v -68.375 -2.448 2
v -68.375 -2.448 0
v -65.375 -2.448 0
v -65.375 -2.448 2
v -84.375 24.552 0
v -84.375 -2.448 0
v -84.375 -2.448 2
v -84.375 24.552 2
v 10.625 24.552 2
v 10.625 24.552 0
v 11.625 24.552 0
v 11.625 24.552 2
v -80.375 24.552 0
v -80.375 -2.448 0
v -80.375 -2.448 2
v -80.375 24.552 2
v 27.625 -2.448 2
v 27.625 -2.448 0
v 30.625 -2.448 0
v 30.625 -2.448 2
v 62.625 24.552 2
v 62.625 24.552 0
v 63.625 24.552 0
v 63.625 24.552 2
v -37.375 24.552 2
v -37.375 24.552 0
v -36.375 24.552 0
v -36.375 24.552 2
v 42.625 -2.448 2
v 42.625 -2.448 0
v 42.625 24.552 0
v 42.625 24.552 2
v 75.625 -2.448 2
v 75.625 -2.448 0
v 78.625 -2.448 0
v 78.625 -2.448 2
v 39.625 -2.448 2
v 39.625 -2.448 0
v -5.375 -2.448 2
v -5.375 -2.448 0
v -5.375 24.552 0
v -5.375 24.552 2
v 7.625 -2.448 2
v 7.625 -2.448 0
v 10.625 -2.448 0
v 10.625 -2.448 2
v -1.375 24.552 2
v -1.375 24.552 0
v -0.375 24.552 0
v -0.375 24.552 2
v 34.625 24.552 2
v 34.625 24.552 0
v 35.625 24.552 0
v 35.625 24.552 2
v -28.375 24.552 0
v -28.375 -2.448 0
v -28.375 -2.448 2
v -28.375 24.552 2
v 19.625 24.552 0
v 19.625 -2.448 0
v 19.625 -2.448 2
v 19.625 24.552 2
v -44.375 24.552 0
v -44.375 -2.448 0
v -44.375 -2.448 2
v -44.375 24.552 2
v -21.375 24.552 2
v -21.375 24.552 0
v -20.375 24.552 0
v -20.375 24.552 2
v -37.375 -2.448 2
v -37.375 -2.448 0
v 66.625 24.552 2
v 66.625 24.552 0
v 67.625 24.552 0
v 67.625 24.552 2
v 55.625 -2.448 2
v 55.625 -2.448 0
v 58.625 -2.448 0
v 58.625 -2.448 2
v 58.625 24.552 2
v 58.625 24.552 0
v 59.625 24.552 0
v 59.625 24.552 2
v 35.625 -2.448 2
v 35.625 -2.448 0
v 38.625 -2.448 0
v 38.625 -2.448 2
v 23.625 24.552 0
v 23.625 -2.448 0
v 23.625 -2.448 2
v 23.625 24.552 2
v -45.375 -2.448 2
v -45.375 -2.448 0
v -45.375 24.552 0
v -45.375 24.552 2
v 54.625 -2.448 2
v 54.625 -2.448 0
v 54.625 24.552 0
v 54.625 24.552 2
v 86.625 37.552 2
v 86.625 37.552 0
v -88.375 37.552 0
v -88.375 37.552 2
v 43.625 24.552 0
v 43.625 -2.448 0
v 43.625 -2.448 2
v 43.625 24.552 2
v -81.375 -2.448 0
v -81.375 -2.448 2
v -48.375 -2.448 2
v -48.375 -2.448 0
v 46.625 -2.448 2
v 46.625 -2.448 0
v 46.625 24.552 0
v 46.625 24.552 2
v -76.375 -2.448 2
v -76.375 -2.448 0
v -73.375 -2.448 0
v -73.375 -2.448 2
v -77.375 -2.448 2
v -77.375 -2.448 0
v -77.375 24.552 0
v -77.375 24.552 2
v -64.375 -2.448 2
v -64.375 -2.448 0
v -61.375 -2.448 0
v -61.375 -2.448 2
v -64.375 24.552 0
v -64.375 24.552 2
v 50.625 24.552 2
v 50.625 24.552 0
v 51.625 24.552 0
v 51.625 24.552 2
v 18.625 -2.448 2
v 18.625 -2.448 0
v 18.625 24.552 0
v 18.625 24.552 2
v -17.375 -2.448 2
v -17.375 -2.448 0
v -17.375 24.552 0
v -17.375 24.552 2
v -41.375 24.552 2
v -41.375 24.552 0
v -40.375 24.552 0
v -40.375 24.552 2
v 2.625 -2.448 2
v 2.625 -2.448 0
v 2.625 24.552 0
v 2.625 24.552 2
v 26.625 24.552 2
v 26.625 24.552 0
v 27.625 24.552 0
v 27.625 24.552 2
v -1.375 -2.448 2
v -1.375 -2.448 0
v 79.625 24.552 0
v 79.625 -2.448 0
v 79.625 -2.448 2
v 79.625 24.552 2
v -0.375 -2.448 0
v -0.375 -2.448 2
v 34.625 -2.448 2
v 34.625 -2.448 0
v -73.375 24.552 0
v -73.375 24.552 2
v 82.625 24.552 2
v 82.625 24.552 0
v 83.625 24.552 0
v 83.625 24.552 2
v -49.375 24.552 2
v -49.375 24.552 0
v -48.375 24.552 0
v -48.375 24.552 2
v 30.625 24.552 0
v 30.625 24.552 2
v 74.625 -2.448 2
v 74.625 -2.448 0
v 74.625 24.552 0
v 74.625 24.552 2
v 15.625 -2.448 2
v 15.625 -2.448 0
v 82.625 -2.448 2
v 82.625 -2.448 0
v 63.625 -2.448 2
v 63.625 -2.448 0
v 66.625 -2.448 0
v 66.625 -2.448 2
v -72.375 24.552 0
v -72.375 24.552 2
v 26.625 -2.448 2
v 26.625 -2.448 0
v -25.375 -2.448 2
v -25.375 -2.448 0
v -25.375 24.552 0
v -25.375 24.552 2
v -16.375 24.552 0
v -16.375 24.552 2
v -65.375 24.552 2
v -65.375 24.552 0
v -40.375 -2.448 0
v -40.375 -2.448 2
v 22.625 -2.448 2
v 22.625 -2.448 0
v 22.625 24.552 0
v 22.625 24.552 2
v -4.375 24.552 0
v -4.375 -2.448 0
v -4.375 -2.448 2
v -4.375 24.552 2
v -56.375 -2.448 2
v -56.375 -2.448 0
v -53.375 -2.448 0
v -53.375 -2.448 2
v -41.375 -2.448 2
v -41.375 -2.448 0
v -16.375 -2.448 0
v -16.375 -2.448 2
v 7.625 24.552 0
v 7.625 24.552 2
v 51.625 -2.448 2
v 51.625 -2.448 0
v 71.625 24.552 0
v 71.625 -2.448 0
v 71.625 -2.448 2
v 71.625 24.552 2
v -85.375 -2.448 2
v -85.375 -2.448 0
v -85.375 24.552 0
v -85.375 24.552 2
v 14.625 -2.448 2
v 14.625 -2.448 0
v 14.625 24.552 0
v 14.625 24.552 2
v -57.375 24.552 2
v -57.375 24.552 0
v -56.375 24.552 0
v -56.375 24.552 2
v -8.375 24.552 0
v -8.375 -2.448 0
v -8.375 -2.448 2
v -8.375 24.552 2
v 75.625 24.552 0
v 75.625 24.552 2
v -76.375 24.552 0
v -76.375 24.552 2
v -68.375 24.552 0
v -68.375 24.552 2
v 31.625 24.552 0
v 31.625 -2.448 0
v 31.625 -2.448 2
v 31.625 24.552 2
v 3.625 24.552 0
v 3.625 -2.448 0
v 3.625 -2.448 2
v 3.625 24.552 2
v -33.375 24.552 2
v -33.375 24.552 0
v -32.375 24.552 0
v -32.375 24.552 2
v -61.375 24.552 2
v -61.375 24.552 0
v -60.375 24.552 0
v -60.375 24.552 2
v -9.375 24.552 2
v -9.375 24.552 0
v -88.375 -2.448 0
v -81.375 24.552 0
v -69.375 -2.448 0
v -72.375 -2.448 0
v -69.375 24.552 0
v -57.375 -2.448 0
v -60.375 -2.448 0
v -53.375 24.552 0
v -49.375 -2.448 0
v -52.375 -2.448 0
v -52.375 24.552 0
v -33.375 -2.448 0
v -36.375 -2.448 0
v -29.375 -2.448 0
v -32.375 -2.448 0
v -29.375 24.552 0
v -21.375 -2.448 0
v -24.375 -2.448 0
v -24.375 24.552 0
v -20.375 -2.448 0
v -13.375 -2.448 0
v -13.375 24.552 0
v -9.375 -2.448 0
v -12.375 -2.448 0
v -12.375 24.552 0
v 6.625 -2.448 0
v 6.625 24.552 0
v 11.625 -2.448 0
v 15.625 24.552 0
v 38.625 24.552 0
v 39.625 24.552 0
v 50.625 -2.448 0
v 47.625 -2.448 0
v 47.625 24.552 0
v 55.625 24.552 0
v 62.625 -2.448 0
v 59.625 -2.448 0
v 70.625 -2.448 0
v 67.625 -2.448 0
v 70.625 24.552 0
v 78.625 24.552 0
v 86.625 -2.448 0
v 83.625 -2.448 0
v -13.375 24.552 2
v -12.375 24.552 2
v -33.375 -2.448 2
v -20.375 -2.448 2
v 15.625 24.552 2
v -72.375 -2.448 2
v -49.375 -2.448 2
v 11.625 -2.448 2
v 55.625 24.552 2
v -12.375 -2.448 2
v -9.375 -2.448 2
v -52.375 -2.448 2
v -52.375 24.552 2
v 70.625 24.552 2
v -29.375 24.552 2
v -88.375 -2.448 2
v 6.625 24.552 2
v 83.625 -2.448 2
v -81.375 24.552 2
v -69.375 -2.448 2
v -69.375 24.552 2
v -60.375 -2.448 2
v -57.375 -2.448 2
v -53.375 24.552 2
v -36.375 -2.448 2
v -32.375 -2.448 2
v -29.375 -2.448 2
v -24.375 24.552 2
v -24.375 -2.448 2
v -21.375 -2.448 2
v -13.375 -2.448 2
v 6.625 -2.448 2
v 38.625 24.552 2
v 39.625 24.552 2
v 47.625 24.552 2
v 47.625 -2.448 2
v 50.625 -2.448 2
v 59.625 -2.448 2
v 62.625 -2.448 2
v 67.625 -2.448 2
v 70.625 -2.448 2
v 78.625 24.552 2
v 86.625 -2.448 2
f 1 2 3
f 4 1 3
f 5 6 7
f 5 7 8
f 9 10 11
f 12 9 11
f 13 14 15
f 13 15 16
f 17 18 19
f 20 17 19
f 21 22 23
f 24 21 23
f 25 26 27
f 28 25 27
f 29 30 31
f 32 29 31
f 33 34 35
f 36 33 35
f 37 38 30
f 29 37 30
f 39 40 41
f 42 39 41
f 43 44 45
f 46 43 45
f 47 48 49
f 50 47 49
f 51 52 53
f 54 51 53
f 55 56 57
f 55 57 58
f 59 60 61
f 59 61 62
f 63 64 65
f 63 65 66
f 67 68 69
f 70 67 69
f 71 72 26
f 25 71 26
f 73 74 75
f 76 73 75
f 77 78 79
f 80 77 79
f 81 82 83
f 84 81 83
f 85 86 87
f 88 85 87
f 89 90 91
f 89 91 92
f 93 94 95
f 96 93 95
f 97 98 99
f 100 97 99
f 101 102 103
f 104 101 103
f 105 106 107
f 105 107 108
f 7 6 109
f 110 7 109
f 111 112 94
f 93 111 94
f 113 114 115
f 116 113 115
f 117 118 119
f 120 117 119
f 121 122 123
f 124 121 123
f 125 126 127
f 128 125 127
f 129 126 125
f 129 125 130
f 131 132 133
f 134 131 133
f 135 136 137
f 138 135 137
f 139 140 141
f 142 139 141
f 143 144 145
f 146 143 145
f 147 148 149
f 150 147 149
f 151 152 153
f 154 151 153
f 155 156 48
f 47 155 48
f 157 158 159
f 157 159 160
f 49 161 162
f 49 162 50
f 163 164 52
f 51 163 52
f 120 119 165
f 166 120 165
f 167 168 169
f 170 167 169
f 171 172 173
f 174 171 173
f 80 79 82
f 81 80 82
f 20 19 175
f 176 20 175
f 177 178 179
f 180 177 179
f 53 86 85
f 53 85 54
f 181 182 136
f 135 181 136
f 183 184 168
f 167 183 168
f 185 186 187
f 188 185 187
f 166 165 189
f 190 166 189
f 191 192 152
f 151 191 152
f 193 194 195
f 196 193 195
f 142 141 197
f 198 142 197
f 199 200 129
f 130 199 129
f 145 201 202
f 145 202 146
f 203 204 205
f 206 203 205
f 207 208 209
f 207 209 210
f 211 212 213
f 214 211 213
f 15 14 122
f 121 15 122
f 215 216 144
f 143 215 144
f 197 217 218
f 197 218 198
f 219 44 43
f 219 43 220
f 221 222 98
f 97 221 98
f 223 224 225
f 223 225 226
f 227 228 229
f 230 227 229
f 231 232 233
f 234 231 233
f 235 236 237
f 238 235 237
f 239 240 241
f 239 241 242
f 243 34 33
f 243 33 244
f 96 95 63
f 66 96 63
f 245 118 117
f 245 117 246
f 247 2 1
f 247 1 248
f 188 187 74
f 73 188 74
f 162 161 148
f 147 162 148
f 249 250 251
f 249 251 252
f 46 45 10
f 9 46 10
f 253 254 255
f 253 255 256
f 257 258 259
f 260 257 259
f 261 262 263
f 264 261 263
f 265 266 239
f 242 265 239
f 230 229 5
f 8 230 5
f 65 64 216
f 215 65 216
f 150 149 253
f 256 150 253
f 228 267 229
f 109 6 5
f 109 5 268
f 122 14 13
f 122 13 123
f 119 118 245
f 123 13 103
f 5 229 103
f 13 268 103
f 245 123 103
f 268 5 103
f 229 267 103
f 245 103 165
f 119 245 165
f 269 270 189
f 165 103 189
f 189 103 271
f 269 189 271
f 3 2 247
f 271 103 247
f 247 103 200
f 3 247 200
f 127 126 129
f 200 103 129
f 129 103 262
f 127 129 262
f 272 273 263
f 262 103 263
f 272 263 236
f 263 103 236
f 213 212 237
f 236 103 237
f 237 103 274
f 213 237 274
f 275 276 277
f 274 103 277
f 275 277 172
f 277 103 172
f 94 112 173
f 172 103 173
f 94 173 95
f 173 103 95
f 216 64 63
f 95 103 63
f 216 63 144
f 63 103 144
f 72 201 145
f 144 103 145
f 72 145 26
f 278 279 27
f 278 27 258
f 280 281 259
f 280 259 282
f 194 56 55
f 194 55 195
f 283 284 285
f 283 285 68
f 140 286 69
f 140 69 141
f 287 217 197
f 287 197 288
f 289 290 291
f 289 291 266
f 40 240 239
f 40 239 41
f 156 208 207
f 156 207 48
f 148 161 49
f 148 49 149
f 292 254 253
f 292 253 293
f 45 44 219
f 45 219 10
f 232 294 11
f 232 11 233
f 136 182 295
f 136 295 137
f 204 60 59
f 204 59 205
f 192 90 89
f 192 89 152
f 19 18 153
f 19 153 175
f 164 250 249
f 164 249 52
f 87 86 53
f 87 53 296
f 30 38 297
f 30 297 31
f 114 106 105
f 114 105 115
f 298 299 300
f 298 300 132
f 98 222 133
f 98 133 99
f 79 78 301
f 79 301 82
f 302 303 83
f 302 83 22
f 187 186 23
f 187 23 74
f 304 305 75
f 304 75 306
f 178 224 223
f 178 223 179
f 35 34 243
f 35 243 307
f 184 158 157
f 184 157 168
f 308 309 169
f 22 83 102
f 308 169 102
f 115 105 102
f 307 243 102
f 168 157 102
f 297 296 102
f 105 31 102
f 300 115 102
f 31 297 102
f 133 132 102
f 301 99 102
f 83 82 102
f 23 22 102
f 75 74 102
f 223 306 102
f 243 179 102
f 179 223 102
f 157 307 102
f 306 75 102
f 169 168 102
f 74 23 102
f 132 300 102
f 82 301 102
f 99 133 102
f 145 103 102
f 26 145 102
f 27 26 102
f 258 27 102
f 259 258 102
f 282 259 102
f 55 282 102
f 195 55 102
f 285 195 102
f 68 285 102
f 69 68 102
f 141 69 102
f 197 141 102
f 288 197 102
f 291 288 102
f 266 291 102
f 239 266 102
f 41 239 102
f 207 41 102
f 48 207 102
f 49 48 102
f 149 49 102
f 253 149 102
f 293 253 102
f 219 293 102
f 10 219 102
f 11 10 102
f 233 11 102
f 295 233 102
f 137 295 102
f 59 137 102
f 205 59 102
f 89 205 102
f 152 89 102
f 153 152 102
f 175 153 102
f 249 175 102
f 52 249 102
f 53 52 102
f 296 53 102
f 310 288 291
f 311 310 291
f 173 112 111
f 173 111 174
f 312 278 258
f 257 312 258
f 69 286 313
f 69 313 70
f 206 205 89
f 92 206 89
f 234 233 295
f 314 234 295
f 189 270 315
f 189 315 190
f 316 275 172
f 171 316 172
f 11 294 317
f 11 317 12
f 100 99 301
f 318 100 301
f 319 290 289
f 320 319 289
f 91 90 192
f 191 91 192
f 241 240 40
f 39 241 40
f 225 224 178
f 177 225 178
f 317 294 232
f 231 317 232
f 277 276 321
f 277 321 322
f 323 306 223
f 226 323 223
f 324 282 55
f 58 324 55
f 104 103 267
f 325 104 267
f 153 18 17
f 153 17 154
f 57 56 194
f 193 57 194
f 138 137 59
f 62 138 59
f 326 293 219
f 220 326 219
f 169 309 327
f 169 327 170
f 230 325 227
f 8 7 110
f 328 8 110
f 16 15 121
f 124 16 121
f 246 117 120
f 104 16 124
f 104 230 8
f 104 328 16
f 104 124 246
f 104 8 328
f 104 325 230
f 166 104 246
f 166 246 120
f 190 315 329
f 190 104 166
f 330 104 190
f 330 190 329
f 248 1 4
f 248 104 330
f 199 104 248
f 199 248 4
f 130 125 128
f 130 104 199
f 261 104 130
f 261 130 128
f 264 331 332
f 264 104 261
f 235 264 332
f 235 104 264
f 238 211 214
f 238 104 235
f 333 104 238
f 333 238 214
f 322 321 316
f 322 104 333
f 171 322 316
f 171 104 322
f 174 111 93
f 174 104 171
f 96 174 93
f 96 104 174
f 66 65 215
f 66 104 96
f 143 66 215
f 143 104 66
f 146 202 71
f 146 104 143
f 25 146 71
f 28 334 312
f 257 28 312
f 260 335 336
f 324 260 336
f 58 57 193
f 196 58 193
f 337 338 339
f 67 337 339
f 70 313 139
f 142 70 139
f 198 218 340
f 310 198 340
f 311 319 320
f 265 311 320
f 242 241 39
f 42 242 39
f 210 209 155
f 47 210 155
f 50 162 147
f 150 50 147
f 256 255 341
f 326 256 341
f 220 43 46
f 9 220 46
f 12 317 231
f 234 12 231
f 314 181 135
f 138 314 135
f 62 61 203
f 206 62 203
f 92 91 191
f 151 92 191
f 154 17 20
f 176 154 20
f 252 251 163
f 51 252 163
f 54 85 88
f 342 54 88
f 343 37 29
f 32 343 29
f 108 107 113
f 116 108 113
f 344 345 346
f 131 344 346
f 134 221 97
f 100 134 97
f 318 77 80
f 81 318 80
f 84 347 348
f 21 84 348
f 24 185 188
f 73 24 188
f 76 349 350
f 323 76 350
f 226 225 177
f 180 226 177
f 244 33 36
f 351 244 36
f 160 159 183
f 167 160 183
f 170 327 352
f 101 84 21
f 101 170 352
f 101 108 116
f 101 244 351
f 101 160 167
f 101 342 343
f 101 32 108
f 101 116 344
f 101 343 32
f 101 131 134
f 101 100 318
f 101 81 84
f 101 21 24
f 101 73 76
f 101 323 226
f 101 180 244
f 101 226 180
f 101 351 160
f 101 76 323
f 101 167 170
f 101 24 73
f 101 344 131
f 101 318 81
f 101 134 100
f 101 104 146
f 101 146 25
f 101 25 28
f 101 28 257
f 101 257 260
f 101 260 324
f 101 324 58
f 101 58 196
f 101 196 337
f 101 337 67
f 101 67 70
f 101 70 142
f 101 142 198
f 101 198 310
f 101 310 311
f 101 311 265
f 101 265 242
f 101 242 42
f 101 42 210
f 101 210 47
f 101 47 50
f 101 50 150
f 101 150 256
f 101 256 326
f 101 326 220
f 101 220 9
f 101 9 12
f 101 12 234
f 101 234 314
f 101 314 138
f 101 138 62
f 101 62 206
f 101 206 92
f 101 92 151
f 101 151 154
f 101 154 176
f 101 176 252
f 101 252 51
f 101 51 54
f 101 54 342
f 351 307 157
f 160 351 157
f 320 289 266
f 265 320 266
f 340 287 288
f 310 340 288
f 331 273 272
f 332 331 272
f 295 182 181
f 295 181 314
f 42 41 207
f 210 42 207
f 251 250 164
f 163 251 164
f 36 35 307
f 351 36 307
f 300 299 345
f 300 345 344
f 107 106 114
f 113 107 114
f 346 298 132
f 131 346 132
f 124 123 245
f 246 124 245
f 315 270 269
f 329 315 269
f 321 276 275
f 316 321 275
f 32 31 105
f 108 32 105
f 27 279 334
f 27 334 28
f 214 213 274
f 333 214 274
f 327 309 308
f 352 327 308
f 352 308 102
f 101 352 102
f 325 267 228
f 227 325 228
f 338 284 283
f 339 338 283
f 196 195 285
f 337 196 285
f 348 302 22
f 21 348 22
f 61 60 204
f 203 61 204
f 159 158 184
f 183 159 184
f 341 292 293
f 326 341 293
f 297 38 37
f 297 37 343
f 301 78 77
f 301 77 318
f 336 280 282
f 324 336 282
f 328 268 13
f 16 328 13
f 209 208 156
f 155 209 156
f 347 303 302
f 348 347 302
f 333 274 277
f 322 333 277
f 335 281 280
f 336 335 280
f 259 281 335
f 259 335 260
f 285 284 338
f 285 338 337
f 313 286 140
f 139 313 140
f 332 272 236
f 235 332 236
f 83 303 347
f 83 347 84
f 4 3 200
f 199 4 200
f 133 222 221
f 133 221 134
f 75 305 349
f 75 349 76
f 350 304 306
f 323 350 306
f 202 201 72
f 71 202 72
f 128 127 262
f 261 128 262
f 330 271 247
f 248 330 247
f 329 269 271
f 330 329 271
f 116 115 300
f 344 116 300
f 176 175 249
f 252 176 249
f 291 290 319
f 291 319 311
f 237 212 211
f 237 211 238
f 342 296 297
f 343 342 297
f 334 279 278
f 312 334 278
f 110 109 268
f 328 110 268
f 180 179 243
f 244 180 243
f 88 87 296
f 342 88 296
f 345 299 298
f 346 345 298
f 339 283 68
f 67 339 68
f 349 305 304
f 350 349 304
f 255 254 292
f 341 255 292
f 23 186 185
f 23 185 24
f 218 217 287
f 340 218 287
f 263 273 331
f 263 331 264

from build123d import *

# Parameters (mm, degrees)
F0_W     = 3
F0_H     = 27
F1_DEPTH = 2


with BuildPart() as f1:
    # F0 (on Top) → F1 (new body)
    with BuildSketch(Plane.XY):
        with Locations((-86.87473, 11.051753)):
            Rectangle(F0_W, F0_H)
        with Locations((-82.87473, 11.051753)):
            Rectangle(F0_W, F0_H)
        with Locations((-78.87473, 11.051753)):
            Rectangle(F0_W, F0_H)
        with Locations((-74.87473, 11.051753)):
            Rectangle(F0_W, F0_H)
        with Locations((-70.87473, 11.051753)):
            Rectangle(F0_W, F0_H)
        with Locations((-66.87473, 11.051753)):
            Rectangle(F0_W, F0_H)
        with Locations((-62.87473, 11.051753)):
            Rectangle(F0_W, F0_H)
        with Locations((-58.87473, 11.051753)):
            Rectangle(F0_W, F0_H)
        with Locations((-54.87473, 11.051753)):
            Rectangle(F0_W, F0_H)
        with Locations((-50.87473, 11.051753)):
            Rectangle(F0_W, F0_H)
        with Locations((-46.87473, 11.051753)):
            Rectangle(F0_W, F0_H)
        with Locations((-42.87473, 11.051753)):
            Rectangle(F0_W, F0_H)
        with Locations((-38.87473, 11.051753)):
            Rectangle(F0_W, F0_H)
        with Locations((-34.87473, 11.051753)):
            Rectangle(F0_W, F0_H)
        with Locations((-30.87473, 11.051753)):
            Rectangle(F0_W, F0_H)
        with Locations((-26.87473, 11.051753)):
            Rectangle(F0_W, F0_H)
        with Locations((-22.87473, 11.051753)):
            Rectangle(F0_W, F0_H)
        with Locations((-18.87473, 11.051753)):
            Rectangle(F0_W, F0_H)
        with Locations((-14.87473, 11.051753)):
            Rectangle(F0_W, F0_H)
        with Locations((-10.87473, 11.051753)):
            Rectangle(F0_W, F0_H)
        with Locations((-6.87473, 11.051753)):
            Rectangle(F0_W, F0_H)
        with Locations((-2.87473, 11.051753)):
            Rectangle(F0_W, F0_H)
        with Locations((1.12527, 11.051753)):
            Rectangle(F0_W, F0_H)
        with Locations((5.12527, 11.051753)):
            Rectangle(F0_W, F0_H)
        with Locations((9.12527, 11.051753)):
            Rectangle(F0_W, F0_H)
        with Locations((13.12527, 11.051753)):
            Rectangle(F0_W, F0_H)
        with Locations((17.12527, 11.051753)):
            Rectangle(F0_W, F0_H)
        with Locations((21.12527, 11.051753)):
            Rectangle(F0_W, F0_H)
        with Locations((25.12527, 11.051753)):
            Rectangle(F0_W, F0_H)
        with Locations((29.12527, 11.051753)):
            Rectangle(F0_W, F0_H)
        with Locations((33.12527, 11.051753)):
            Rectangle(F0_W, F0_H)
        with Locations((37.12527, 11.051753)):
            Rectangle(F0_W, F0_H)
        with Locations((41.12527, 11.051753)):
            Rectangle(F0_W, F0_H)
        with Locations((45.12527, 11.051753)):
            Rectangle(F0_W, F0_H)
        with Locations((49.12527, 11.051753)):
            Rectangle(F0_W, F0_H)
        with Locations((53.12527, 11.051753)):
            Rectangle(F0_W, F0_H)
        with Locations((57.12527, 11.051753)):
            Rectangle(F0_W, F0_H)
        with Locations((61.12527, 11.051753)):
            Rectangle(F0_W, F0_H)
        with Locations((65.12527, 11.051753)):
            Rectangle(F0_W, F0_H)
        with Locations((69.12527, 11.051753)):
            Rectangle(F0_W, F0_H)
        with Locations((73.12527, 11.051753)):
            Rectangle(F0_W, F0_H)
        with Locations((77.12527, 11.051753)):
            Rectangle(F0_W, F0_H)
        with Locations((81.12527, 11.051753)):
            Rectangle(F0_W, F0_H)
        with Locations((85.12527, 11.051753)):
            Rectangle(F0_W, F0_H)
        Polygon((86.62527, 37.551753), (-88.37473, 37.551753), (-88.37473, 24.551753), (-85.37473, 24.551753), (-84.37473, 24.551753), (-81.37473, 24.551753), (-80.37473, 24.551753), (-77.37473, 24.551753), (-76.37473, 24.551753), (-73.37473, 24.551753), (-72.37473, 24.551753), (-69.37473, 24.551753), (-68.37473, 24.551753), (-65.37473, 24.551753), (-64.37473, 24.551753), (-61.37473, 24.551753), (-60.37473, 24.551753), (-57.37473, 24.551753), (-56.37473, 24.551753), (-53.37473, 24.551753), (-52.37473, 24.551753), (-49.37473, 24.551753), (-48.37473, 24.551753), (-45.37473, 24.551753), (-44.37473, 24.551753), (-41.37473, 24.551753), (-40.37473, 24.551753), (-37.37473, 24.551753), (-36.37473, 24.551753), (-33.37473, 24.551753), (-32.37473, 24.551753), (-29.37473, 24.551753), (-28.37473, 24.551753), (-25.37473, 24.551753), (-24.37473, 24.551753), (-21.37473, 24.551753), (-20.37473, 24.551753), (-17.37473, 24.551753), (-16.37473, 24.551753), (-13.37473, 24.551753), (-12.37473, 24.551753), (-9.37473, 24.551753), (-8.37473, 24.551753), (-5.37473, 24.551753), (-4.37473, 24.551753), (-1.37473, 24.551753), (-0.37473, 24.551753), (2.62527, 24.551753), (3.62527, 24.551753), (6.62527, 24.551753), (7.62527, 24.551753), (10.62527, 24.551753), (11.62527, 24.551753), (14.62527, 24.551753), (15.62527, 24.551753), (18.62527, 24.551753), (19.62527, 24.551753), (22.62527, 24.551753), (23.62527, 24.551753), (26.62527, 24.551753), (27.62527, 24.551753), (30.62527, 24.551753), (31.62527, 24.551753), (34.62527, 24.551753), (35.62527, 24.551753), (38.62527, 24.551753), (39.62527, 24.551753), (42.62527, 24.551753), (43.62527, 24.551753), (46.62527, 24.551753), (47.62527, 24.551753), (50.62527, 24.551753), (51.62527, 24.551753), (54.62527, 24.551753), (55.62527, 24.551753), (58.62527, 24.551753), (59.62527, 24.551753), (62.62527, 24.551753), (63.62527, 24.551753), (66.62527, 24.551753), (67.62527, 24.551753), (70.62527, 24.551753), (71.62527, 24.551753), (74.62527, 24.551753), (75.62527, 24.551753), (78.62527, 24.551753), (79.62527, 24.551753), (82.62527, 24.551753), (83.62527, 24.551753), (86.62527, 24.551753), align=None)
    extrude(amount=F1_DEPTH)


solid = f1.part
